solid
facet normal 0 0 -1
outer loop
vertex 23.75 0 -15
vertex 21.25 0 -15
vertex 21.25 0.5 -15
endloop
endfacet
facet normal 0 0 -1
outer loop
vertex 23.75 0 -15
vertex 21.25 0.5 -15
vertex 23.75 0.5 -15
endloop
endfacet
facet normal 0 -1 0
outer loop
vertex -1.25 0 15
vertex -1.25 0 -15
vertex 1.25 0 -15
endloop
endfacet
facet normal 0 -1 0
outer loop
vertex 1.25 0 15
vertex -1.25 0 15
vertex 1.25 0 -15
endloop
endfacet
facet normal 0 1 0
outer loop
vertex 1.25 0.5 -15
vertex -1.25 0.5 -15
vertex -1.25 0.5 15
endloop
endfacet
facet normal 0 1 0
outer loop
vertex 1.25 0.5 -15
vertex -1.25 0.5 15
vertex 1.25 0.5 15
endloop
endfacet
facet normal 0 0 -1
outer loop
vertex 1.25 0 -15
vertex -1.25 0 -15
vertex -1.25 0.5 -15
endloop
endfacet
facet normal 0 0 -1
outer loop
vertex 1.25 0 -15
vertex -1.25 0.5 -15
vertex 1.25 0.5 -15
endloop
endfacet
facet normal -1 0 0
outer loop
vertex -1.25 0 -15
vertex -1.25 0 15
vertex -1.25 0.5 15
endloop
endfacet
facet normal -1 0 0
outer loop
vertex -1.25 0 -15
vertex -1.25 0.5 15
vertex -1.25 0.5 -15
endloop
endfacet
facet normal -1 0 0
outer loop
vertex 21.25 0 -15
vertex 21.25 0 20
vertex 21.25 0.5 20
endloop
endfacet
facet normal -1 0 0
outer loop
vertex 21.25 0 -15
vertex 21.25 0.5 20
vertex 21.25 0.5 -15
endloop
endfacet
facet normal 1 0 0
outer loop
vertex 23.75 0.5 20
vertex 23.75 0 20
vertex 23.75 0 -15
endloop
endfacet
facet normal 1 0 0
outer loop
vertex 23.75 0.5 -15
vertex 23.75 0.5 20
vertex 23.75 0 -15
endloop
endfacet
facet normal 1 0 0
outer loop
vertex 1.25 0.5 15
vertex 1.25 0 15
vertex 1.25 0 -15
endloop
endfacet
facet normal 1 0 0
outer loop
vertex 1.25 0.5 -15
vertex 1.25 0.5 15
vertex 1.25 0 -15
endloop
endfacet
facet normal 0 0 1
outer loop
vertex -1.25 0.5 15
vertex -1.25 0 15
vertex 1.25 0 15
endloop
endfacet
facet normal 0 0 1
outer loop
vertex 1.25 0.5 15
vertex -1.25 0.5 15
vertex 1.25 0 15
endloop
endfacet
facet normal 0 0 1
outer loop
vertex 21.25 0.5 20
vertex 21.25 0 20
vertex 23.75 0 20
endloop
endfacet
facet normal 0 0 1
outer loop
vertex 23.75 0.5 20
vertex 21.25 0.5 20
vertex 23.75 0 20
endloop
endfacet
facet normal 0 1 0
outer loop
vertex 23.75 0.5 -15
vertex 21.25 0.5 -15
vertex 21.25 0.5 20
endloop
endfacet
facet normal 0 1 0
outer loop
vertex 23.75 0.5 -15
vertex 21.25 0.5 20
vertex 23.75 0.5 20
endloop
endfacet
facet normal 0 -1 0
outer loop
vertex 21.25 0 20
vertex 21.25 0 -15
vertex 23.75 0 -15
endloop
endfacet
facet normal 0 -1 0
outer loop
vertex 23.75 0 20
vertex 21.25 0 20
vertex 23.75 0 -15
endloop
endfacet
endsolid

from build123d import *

# Parameters (mm, degrees)
SKETCH1_W             = 2.5
SKETCH1_H             = 35
BOSS_EXTRUDE1_DEPTH   = 0.5
SKETCH1_H_2           = 30
BOSS_EXTRUDE1_2_DEPTH = 0.5


with BuildPart() as part:
    # Sketch1 → Boss-Extrude1 (new body)
    with BuildSketch(Plane(origin=(0, 0, 0), x_dir=(1, 0, 0), z_dir=(0, 1, 0))):
        with Locations((22.5, -2.5)):
            Rectangle(SKETCH1_W, SKETCH1_H)
    extrude(amount=BOSS_EXTRUDE1_DEPTH)


with BuildPart() as body_2:
    # Sketch1 → Boss-Extrude1 2 (new body)
    with BuildSketch(Plane(origin=(0, 0, 0), x_dir=(1, 0, 0), z_dir=(0, 1, 0))):
        Rectangle(SKETCH1_W, SKETCH1_H_2)
    extrude(amount=BOSS_EXTRUDE1_2_DEPTH)


solid = Compound([part.part, body_2.part])
